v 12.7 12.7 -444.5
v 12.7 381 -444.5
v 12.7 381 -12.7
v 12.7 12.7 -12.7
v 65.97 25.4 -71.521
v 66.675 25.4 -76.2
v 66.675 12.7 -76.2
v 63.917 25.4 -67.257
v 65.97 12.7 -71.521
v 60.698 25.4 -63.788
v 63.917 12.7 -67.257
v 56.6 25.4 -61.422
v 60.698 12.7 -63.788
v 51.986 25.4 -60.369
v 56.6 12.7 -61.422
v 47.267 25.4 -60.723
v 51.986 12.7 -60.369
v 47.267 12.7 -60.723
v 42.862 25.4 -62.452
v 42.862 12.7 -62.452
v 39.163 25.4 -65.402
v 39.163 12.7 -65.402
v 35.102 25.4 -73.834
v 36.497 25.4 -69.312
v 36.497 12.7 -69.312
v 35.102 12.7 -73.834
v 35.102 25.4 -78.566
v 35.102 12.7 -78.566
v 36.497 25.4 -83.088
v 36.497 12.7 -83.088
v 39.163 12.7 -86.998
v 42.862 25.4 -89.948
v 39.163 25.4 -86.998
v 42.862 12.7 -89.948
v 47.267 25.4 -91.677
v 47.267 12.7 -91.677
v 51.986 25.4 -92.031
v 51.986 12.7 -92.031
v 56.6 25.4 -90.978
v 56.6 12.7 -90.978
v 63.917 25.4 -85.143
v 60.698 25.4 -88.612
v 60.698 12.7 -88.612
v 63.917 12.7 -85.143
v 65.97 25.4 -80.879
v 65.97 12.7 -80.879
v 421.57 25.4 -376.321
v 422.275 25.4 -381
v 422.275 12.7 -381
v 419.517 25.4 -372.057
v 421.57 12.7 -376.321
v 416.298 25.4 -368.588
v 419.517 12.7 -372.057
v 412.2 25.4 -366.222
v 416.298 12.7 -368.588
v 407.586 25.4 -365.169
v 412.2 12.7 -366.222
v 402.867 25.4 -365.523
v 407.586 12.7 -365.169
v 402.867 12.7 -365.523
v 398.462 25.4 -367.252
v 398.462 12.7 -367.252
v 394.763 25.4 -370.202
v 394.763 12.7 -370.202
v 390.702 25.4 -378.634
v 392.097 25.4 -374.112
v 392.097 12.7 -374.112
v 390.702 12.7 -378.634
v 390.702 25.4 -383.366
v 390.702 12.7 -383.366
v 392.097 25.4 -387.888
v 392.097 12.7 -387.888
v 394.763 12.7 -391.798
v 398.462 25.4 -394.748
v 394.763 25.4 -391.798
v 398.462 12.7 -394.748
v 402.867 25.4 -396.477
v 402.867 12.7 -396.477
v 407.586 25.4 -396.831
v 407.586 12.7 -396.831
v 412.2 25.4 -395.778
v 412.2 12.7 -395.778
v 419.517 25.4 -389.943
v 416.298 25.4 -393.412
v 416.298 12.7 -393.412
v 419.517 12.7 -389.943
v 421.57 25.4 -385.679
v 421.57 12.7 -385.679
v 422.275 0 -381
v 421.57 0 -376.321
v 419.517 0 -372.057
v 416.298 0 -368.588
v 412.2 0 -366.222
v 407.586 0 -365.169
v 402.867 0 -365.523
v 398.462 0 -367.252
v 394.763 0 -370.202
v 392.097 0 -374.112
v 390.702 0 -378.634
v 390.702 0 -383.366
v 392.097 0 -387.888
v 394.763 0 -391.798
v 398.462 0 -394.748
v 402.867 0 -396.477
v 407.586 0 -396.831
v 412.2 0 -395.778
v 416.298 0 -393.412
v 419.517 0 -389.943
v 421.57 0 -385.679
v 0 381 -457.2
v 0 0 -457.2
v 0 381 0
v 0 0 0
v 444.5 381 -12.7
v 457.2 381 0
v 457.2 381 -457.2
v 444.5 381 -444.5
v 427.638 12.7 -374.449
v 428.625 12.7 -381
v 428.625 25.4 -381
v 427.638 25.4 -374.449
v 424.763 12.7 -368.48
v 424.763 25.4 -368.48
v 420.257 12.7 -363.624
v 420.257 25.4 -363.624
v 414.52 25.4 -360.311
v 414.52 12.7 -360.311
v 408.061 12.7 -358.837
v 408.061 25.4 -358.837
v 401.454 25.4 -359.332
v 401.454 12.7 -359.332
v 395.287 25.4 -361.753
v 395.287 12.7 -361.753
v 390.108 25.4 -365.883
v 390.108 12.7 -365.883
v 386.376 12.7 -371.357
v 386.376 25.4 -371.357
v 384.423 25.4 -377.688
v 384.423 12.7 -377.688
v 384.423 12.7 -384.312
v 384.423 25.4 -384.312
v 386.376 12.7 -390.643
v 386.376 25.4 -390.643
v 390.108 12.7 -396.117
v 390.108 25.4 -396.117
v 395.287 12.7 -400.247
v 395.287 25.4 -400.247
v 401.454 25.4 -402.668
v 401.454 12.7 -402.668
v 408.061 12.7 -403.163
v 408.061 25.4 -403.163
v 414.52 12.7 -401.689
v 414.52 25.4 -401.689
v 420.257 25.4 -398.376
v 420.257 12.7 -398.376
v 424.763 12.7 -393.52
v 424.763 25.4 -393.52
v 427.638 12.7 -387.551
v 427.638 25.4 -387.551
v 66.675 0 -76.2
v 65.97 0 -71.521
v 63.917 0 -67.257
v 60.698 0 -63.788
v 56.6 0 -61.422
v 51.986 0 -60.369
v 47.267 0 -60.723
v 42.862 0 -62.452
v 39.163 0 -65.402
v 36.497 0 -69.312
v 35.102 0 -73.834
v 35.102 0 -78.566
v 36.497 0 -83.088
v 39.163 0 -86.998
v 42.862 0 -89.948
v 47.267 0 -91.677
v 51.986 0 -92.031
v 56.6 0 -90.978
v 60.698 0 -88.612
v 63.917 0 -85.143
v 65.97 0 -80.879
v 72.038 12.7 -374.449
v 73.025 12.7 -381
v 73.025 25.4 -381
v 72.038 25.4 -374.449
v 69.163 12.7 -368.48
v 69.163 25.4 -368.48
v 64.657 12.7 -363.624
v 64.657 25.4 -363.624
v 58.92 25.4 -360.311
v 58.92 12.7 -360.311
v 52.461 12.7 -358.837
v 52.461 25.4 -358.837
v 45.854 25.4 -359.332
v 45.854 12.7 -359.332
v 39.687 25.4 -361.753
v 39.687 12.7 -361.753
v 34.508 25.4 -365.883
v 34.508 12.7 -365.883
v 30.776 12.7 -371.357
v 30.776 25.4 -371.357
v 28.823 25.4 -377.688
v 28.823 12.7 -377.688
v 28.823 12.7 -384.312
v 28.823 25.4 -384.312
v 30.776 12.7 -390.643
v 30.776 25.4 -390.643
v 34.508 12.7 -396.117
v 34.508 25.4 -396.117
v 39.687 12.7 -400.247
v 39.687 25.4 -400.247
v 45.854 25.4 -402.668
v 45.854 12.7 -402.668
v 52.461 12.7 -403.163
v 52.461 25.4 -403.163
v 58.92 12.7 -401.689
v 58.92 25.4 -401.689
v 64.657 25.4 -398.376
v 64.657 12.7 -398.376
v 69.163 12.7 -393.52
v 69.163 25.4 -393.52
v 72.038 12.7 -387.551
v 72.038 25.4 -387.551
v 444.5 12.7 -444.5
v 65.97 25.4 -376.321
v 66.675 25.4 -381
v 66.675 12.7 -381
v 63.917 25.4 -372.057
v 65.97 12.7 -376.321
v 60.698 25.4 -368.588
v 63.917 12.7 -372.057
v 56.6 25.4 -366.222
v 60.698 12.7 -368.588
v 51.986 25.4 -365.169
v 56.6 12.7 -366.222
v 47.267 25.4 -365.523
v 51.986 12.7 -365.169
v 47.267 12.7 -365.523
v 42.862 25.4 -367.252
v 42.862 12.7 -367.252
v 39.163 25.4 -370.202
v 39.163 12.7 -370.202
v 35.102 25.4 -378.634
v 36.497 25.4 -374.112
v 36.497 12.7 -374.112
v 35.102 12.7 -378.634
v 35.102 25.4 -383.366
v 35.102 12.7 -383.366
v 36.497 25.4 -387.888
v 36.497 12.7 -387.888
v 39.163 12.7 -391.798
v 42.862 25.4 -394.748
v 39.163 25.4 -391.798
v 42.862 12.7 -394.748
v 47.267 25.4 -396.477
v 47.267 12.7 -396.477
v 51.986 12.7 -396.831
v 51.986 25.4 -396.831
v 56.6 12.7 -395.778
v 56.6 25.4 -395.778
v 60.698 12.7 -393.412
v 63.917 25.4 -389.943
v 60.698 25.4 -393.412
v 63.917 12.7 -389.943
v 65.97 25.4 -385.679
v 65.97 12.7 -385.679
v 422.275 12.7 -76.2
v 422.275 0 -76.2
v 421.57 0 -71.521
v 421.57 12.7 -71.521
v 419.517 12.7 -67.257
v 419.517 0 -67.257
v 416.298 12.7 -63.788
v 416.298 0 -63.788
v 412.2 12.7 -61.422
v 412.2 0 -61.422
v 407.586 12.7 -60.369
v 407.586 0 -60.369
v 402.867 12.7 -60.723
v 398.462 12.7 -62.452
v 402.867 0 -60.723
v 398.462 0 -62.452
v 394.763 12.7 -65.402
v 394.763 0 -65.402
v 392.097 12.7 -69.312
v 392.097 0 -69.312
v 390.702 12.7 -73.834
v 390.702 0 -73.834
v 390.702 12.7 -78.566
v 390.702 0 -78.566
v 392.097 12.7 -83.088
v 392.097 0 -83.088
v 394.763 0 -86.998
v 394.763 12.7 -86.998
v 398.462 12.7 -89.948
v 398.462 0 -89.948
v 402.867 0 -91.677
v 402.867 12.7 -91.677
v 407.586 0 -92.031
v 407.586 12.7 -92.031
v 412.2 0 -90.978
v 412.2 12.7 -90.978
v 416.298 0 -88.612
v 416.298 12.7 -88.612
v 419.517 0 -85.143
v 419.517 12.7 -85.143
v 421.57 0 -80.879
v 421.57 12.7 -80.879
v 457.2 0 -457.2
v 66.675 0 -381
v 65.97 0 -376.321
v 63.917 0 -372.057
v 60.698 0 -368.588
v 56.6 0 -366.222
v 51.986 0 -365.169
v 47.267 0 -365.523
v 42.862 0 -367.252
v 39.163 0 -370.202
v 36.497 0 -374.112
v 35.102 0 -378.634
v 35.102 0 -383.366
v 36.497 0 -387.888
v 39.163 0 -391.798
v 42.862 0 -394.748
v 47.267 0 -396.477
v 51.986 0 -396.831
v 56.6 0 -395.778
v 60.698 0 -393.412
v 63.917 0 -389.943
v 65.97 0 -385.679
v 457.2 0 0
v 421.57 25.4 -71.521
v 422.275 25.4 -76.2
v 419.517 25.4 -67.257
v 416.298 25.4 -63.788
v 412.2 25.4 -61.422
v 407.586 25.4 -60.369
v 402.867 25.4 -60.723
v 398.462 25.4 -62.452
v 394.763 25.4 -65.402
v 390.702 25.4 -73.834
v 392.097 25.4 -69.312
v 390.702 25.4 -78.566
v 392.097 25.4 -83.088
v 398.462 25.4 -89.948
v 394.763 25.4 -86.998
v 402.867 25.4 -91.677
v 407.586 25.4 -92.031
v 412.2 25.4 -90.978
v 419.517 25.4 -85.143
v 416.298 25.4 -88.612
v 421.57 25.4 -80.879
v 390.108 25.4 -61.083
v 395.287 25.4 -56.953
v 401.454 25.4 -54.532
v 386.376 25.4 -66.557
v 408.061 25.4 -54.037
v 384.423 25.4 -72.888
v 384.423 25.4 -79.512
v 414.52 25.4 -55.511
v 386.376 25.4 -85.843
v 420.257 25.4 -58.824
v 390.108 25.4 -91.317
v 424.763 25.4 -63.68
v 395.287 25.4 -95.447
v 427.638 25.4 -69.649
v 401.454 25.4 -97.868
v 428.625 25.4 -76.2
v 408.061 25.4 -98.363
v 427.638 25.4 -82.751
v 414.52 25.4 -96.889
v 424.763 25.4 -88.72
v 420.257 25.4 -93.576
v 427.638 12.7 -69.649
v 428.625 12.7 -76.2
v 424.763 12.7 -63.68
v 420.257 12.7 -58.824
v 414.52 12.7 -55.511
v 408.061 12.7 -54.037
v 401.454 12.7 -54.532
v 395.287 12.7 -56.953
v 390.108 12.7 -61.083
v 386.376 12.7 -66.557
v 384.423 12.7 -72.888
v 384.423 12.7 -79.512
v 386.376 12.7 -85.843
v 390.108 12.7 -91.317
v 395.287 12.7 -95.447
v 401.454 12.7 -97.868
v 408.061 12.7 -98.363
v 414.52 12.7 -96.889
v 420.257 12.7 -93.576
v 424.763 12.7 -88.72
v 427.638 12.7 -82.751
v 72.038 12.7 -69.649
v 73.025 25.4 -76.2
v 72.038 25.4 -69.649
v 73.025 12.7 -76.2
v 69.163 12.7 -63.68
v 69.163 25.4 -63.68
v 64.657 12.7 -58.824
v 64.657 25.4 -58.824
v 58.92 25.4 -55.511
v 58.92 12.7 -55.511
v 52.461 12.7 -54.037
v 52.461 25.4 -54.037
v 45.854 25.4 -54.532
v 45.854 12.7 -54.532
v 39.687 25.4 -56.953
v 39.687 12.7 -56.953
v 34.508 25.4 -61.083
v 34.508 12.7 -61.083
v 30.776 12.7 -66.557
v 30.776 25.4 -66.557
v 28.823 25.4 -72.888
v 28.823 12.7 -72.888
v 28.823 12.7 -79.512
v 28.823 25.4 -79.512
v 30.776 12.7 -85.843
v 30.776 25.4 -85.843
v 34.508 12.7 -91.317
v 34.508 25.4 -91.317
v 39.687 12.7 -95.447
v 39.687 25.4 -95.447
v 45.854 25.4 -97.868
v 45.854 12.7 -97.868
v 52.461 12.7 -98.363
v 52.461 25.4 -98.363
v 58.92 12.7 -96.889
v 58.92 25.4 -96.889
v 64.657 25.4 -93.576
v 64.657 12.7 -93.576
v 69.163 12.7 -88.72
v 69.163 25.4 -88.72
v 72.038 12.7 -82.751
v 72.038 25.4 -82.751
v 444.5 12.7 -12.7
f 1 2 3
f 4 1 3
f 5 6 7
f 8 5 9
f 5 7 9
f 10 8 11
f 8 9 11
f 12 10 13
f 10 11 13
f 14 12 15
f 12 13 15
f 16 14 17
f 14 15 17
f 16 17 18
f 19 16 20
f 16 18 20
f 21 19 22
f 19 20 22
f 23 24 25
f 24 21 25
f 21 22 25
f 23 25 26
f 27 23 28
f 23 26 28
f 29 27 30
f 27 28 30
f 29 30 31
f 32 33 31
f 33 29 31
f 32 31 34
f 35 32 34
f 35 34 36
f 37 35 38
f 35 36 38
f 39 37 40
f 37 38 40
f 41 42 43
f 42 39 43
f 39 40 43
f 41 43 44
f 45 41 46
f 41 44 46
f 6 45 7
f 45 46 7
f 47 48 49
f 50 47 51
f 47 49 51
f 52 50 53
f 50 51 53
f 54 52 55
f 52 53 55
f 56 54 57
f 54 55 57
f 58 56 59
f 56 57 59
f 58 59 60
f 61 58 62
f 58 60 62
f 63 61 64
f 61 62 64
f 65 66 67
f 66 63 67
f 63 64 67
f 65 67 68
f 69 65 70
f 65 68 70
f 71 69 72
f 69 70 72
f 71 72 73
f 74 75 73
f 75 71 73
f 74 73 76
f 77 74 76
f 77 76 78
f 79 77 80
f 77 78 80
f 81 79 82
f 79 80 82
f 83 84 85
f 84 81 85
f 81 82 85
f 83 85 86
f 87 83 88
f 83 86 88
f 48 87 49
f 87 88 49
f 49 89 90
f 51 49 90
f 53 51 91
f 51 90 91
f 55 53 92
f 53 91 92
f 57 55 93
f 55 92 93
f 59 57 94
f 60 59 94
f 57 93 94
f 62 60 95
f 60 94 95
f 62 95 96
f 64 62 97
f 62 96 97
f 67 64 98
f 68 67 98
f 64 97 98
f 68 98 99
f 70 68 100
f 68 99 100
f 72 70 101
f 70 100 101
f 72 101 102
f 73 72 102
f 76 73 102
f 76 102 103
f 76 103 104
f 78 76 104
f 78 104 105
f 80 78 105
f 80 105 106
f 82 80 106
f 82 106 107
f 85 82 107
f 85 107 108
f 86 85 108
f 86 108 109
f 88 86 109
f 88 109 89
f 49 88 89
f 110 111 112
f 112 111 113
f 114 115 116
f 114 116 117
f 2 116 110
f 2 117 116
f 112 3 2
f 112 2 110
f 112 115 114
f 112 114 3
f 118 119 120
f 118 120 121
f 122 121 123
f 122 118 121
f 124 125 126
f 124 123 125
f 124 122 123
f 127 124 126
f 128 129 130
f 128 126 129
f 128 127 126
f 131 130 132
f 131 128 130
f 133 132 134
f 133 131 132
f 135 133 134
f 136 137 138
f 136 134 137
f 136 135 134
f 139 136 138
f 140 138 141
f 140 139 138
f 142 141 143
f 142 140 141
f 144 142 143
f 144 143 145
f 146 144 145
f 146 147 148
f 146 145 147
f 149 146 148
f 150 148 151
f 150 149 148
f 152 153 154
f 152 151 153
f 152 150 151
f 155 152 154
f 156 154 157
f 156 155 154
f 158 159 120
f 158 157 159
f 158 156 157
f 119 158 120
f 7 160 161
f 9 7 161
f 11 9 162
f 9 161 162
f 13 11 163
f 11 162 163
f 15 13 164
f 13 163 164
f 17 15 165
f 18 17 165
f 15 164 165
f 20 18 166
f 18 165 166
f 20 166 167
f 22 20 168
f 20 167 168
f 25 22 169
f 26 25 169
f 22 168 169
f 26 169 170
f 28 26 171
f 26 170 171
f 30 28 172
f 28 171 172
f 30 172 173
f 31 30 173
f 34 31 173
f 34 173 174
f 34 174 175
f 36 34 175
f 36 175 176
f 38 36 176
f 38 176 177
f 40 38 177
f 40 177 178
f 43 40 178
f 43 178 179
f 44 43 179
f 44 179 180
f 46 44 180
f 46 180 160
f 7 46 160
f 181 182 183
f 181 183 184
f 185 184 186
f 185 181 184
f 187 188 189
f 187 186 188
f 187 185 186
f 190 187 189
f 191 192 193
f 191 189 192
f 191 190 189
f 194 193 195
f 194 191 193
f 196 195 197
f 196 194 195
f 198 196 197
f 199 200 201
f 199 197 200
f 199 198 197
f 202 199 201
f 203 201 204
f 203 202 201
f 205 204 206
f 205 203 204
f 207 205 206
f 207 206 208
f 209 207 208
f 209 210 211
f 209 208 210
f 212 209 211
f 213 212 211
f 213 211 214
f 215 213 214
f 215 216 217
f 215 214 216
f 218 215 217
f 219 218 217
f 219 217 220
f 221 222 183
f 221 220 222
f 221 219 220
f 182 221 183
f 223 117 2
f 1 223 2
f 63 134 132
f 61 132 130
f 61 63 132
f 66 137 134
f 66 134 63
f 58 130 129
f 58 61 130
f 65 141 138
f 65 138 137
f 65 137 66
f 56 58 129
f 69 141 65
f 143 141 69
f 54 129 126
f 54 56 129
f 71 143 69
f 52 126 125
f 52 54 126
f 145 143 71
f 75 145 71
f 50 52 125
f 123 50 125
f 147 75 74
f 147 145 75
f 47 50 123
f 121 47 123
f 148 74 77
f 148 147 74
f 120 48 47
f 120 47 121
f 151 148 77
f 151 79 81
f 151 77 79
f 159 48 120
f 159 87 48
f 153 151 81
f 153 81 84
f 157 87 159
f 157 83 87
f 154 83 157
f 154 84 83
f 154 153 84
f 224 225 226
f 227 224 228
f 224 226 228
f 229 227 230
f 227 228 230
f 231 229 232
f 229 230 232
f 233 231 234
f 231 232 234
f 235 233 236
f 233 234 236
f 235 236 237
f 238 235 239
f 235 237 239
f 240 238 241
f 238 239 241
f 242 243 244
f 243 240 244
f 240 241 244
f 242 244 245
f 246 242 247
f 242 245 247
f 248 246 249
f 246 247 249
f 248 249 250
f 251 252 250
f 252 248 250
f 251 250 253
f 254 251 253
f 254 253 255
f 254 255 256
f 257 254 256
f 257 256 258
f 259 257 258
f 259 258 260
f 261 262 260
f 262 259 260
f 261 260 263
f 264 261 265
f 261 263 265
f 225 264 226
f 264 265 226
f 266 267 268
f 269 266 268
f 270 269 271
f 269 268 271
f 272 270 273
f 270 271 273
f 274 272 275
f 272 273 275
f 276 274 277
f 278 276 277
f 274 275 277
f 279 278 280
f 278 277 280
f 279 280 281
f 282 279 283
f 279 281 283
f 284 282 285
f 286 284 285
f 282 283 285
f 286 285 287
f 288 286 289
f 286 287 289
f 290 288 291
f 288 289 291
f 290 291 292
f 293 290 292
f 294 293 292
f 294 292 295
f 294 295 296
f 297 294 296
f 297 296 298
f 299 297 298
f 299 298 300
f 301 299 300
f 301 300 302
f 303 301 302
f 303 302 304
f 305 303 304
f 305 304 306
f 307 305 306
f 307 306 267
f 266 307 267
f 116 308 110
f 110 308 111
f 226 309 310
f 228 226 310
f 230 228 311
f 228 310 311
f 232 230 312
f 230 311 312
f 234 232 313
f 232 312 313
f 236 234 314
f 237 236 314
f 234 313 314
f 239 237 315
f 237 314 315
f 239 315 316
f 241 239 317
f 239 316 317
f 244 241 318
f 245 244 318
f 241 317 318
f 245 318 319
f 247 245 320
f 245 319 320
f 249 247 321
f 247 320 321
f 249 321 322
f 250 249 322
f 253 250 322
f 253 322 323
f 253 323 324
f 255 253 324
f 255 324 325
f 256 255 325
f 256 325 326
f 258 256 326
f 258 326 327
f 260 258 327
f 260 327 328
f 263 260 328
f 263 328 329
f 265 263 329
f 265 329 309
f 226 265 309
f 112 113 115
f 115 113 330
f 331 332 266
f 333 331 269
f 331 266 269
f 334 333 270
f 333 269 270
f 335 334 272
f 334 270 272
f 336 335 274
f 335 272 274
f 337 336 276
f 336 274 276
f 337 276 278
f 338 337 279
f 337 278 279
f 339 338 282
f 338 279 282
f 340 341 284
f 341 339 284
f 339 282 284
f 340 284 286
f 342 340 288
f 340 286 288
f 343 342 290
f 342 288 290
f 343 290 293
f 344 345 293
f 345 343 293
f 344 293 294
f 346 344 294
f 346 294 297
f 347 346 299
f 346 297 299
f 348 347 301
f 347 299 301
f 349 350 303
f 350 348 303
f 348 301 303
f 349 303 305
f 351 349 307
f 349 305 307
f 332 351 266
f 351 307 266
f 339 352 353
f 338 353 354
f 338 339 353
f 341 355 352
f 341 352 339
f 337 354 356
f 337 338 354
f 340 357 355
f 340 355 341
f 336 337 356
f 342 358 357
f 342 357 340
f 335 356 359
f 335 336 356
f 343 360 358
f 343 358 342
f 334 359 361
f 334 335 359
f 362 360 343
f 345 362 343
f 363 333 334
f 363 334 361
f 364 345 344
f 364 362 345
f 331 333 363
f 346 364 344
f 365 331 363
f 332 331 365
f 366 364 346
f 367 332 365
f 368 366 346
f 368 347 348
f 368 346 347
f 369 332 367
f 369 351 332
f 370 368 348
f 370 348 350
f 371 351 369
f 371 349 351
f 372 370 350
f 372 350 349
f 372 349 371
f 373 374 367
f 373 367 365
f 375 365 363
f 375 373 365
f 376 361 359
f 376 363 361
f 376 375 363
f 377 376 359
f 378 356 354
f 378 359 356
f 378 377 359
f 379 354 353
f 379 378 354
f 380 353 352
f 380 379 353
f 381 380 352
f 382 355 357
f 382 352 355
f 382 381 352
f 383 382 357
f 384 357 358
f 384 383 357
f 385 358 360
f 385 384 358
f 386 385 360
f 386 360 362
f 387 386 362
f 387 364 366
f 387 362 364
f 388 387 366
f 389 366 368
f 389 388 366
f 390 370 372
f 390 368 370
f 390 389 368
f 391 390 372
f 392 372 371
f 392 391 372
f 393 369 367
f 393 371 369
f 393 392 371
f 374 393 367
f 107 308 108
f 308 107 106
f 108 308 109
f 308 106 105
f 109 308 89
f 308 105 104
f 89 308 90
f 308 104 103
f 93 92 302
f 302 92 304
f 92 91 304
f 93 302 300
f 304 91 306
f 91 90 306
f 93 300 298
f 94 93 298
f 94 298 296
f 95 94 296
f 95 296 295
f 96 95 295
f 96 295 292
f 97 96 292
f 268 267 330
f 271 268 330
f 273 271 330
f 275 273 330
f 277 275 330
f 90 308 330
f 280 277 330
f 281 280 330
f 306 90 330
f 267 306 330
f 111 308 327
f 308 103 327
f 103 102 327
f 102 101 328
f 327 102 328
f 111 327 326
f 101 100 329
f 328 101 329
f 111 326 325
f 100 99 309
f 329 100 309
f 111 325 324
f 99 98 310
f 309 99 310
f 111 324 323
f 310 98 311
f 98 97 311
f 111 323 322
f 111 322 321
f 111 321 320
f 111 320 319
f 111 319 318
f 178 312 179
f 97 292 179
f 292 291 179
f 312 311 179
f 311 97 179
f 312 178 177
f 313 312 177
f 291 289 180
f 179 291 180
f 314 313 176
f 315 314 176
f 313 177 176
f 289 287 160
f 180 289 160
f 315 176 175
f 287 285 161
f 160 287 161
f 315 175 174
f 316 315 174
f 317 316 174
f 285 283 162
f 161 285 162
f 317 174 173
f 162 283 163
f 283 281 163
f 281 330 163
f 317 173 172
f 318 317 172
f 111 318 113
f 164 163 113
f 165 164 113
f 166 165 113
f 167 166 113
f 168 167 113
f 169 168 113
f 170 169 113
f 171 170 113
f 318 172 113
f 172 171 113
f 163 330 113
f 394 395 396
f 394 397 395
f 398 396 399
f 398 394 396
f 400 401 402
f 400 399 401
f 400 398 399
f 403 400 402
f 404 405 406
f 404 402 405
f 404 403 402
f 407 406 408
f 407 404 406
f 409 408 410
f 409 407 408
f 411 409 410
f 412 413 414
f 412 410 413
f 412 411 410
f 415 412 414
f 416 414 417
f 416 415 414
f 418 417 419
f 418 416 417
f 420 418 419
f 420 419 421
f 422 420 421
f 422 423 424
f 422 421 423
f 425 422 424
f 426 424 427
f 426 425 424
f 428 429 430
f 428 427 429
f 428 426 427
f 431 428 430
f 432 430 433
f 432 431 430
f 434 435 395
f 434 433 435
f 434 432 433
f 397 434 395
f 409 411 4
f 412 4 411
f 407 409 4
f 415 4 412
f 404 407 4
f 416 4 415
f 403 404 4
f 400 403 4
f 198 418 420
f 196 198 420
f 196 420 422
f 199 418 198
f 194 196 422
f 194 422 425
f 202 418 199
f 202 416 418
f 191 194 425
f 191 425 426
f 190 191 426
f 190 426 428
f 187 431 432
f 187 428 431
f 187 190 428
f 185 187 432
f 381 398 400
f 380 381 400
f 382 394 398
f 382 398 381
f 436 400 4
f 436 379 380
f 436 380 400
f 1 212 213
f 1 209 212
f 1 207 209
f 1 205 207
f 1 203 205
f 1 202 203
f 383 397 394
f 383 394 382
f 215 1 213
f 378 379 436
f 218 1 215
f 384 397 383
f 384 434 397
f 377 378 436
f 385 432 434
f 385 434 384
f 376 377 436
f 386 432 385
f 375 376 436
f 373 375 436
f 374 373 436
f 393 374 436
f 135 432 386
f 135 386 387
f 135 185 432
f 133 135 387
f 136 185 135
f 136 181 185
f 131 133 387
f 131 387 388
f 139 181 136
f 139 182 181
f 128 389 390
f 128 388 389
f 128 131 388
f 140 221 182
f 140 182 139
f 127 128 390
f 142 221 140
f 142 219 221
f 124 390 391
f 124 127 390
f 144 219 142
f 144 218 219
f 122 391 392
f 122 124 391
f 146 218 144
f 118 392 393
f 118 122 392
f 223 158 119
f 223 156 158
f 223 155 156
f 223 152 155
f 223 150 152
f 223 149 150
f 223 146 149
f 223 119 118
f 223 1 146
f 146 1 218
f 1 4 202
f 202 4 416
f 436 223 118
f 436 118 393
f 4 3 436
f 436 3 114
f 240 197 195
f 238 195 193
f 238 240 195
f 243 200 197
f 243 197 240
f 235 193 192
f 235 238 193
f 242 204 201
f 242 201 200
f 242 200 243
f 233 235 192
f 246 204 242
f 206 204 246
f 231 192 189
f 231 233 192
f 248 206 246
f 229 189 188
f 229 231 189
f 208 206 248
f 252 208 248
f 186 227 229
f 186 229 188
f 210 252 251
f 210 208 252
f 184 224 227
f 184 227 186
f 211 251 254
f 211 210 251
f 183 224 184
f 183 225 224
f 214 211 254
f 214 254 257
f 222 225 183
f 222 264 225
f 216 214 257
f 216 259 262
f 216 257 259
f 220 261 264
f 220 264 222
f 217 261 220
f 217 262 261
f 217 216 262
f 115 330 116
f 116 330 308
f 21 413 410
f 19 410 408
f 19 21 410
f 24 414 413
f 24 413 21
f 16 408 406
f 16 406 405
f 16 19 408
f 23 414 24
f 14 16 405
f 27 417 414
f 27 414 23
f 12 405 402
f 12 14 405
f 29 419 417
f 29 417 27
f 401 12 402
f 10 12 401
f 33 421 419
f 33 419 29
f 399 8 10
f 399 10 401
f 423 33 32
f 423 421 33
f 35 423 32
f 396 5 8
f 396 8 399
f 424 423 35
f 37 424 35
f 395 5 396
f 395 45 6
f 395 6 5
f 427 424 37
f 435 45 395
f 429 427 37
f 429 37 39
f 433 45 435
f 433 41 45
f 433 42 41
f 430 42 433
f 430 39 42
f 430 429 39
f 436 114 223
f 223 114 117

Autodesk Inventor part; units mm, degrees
ref_plane "YZ Plane" through (0, 0, 0) normal (1, 0, 0) x (0, 1, 0)
ref_plane "XZ Plane" through (0, 0, 0) normal (0, 1, 0) x (-1, 0, 0)
ref_plane "XY Plane" through (0, 0, 0) normal (0, 0, 1) x (1, 0, 0)
sketch "Sketch1" plane through (0, 0, 0) normal (0, 1, 0) x (-1, 0, 0)
  line L0 (0, 0) -> (-457.2, 0)
  line L1 (-457.2, 0) -> (-457.2, -457.2)
  line L2 (-457.2, -457.2) -> (0, -457.2)
  line L3 (0, -457.2) -> (0, 0)
  dimension "d0" = 457.2
  dimension "d1" = 457.2
extrude "Extrusion1" add sketch "Sketch1" along normal blind 381
sketch "Sketch2" plane through (0, 381, 0) normal (0, 1, 0) x (1, 0, 0)
  line L0 (0, 0) -> (457.2, 0) projected
  line L1 (457.2, 0) -> (457.2, 457.2) projected
  line L2 (457.2, 457.2) -> (0, 457.2) projected
  line L3 (0, 457.2) -> (0, 0) projected
  line L4 (12.7, 12.7) -> (444.5, 12.7)
  line L5 (444.5, 12.7) -> (444.5, 444.5)
  line L6 (444.5, 444.5) -> (12.7, 444.5)
  line L7 (12.7, 444.5) -> (12.7, 12.7)
  dimension "d4" = 12.7
extrude "Extrusion2" cut sketch "Sketch2" against normal blind 368.3 contours L7 L6 L5 L4
sketch "Sketch3" plane through (0, 0, 0) normal (0, -1, 0) x (1, 0, 0)
  line L0 (0, 0) -> (457.2, 0) projected
  line L1 (0, -457.2) -> (0, 0) projected
  line L2 (457.2, -457.2) -> (0, -457.2) projected
  line L3 (457.2, 0) -> (457.2, -457.2) projected
  line L4 (457.2, 0) -> (406.4, 0) construction
  line L5 (0, 0) -> (457.2, 0) construction
  line L6 (406.4, 0) -> (406.4, -76.2) construction
  circle A0 centre (406.4, -76.2) radius 15.875
  line L7 (457.2, 0) -> (457.2, -457.2) construction
  line L8 (457.2, -228.6) -> (0, -228.6) construction
  line L9 (228.6, 0) -> (228.6, -457.2) construction
  circle A1 centre (406.4, -381) radius 15.875
  circle A2 centre (50.8, -381) radius 15.875
  circle A3 centre (50.8, -76.2) radius 15.875
  point P0 (228.6, -228.6)
  dimension "d7" = 50.8
  dimension "d8" = 76.2
  dimension "d9" = 31.75
extrude "Extrusion3" cut sketch "Sketch3" against normal blind 25.4 contours A0 | A1 | A2 | A3
sketch "Sketch5" plane through (0, 12.7, 0) normal (0, 1, 0) x (1, 0, 0)
  circle A0 centre (50.8, 381) radius 15.875 projected
  circle A1 centre (406.4, 76.2) radius 15.875 projected
  circle A2 centre (406.4, 381) radius 15.875 projected
  circle A3 centre (50.8, 76.2) radius 15.875 projected
  line L0 (444.5, 12.7) -> (12.7, 12.7) projected
  line L1 (444.5, 444.5) -> (444.5, 12.7) projected
  line L2 (12.7, 444.5) -> (444.5, 444.5) projected
  line L3 (12.7, 12.7) -> (12.7, 444.5) projected
  circle A4 centre (50.8, 381) radius 22.225
  circle A5 centre (406.4, 381) radius 22.225
  circle A6 centre (50.8, 76.2) radius 22.225
  circle A7 centre (406.4, 76.2) radius 22.225
  point P0 (0, 0)
  dimension "d19" = 6.35
  dimension "d20" = 6.35
  dimension "d21" = 6.35
  dimension "d22" = 6.35
extrude "Extrusion5" add sketch "Sketch5" along normal blind 12.7 contours A4 | A5 | A6 | A7
properties part number "Attachable top" material "PET Plastic"
